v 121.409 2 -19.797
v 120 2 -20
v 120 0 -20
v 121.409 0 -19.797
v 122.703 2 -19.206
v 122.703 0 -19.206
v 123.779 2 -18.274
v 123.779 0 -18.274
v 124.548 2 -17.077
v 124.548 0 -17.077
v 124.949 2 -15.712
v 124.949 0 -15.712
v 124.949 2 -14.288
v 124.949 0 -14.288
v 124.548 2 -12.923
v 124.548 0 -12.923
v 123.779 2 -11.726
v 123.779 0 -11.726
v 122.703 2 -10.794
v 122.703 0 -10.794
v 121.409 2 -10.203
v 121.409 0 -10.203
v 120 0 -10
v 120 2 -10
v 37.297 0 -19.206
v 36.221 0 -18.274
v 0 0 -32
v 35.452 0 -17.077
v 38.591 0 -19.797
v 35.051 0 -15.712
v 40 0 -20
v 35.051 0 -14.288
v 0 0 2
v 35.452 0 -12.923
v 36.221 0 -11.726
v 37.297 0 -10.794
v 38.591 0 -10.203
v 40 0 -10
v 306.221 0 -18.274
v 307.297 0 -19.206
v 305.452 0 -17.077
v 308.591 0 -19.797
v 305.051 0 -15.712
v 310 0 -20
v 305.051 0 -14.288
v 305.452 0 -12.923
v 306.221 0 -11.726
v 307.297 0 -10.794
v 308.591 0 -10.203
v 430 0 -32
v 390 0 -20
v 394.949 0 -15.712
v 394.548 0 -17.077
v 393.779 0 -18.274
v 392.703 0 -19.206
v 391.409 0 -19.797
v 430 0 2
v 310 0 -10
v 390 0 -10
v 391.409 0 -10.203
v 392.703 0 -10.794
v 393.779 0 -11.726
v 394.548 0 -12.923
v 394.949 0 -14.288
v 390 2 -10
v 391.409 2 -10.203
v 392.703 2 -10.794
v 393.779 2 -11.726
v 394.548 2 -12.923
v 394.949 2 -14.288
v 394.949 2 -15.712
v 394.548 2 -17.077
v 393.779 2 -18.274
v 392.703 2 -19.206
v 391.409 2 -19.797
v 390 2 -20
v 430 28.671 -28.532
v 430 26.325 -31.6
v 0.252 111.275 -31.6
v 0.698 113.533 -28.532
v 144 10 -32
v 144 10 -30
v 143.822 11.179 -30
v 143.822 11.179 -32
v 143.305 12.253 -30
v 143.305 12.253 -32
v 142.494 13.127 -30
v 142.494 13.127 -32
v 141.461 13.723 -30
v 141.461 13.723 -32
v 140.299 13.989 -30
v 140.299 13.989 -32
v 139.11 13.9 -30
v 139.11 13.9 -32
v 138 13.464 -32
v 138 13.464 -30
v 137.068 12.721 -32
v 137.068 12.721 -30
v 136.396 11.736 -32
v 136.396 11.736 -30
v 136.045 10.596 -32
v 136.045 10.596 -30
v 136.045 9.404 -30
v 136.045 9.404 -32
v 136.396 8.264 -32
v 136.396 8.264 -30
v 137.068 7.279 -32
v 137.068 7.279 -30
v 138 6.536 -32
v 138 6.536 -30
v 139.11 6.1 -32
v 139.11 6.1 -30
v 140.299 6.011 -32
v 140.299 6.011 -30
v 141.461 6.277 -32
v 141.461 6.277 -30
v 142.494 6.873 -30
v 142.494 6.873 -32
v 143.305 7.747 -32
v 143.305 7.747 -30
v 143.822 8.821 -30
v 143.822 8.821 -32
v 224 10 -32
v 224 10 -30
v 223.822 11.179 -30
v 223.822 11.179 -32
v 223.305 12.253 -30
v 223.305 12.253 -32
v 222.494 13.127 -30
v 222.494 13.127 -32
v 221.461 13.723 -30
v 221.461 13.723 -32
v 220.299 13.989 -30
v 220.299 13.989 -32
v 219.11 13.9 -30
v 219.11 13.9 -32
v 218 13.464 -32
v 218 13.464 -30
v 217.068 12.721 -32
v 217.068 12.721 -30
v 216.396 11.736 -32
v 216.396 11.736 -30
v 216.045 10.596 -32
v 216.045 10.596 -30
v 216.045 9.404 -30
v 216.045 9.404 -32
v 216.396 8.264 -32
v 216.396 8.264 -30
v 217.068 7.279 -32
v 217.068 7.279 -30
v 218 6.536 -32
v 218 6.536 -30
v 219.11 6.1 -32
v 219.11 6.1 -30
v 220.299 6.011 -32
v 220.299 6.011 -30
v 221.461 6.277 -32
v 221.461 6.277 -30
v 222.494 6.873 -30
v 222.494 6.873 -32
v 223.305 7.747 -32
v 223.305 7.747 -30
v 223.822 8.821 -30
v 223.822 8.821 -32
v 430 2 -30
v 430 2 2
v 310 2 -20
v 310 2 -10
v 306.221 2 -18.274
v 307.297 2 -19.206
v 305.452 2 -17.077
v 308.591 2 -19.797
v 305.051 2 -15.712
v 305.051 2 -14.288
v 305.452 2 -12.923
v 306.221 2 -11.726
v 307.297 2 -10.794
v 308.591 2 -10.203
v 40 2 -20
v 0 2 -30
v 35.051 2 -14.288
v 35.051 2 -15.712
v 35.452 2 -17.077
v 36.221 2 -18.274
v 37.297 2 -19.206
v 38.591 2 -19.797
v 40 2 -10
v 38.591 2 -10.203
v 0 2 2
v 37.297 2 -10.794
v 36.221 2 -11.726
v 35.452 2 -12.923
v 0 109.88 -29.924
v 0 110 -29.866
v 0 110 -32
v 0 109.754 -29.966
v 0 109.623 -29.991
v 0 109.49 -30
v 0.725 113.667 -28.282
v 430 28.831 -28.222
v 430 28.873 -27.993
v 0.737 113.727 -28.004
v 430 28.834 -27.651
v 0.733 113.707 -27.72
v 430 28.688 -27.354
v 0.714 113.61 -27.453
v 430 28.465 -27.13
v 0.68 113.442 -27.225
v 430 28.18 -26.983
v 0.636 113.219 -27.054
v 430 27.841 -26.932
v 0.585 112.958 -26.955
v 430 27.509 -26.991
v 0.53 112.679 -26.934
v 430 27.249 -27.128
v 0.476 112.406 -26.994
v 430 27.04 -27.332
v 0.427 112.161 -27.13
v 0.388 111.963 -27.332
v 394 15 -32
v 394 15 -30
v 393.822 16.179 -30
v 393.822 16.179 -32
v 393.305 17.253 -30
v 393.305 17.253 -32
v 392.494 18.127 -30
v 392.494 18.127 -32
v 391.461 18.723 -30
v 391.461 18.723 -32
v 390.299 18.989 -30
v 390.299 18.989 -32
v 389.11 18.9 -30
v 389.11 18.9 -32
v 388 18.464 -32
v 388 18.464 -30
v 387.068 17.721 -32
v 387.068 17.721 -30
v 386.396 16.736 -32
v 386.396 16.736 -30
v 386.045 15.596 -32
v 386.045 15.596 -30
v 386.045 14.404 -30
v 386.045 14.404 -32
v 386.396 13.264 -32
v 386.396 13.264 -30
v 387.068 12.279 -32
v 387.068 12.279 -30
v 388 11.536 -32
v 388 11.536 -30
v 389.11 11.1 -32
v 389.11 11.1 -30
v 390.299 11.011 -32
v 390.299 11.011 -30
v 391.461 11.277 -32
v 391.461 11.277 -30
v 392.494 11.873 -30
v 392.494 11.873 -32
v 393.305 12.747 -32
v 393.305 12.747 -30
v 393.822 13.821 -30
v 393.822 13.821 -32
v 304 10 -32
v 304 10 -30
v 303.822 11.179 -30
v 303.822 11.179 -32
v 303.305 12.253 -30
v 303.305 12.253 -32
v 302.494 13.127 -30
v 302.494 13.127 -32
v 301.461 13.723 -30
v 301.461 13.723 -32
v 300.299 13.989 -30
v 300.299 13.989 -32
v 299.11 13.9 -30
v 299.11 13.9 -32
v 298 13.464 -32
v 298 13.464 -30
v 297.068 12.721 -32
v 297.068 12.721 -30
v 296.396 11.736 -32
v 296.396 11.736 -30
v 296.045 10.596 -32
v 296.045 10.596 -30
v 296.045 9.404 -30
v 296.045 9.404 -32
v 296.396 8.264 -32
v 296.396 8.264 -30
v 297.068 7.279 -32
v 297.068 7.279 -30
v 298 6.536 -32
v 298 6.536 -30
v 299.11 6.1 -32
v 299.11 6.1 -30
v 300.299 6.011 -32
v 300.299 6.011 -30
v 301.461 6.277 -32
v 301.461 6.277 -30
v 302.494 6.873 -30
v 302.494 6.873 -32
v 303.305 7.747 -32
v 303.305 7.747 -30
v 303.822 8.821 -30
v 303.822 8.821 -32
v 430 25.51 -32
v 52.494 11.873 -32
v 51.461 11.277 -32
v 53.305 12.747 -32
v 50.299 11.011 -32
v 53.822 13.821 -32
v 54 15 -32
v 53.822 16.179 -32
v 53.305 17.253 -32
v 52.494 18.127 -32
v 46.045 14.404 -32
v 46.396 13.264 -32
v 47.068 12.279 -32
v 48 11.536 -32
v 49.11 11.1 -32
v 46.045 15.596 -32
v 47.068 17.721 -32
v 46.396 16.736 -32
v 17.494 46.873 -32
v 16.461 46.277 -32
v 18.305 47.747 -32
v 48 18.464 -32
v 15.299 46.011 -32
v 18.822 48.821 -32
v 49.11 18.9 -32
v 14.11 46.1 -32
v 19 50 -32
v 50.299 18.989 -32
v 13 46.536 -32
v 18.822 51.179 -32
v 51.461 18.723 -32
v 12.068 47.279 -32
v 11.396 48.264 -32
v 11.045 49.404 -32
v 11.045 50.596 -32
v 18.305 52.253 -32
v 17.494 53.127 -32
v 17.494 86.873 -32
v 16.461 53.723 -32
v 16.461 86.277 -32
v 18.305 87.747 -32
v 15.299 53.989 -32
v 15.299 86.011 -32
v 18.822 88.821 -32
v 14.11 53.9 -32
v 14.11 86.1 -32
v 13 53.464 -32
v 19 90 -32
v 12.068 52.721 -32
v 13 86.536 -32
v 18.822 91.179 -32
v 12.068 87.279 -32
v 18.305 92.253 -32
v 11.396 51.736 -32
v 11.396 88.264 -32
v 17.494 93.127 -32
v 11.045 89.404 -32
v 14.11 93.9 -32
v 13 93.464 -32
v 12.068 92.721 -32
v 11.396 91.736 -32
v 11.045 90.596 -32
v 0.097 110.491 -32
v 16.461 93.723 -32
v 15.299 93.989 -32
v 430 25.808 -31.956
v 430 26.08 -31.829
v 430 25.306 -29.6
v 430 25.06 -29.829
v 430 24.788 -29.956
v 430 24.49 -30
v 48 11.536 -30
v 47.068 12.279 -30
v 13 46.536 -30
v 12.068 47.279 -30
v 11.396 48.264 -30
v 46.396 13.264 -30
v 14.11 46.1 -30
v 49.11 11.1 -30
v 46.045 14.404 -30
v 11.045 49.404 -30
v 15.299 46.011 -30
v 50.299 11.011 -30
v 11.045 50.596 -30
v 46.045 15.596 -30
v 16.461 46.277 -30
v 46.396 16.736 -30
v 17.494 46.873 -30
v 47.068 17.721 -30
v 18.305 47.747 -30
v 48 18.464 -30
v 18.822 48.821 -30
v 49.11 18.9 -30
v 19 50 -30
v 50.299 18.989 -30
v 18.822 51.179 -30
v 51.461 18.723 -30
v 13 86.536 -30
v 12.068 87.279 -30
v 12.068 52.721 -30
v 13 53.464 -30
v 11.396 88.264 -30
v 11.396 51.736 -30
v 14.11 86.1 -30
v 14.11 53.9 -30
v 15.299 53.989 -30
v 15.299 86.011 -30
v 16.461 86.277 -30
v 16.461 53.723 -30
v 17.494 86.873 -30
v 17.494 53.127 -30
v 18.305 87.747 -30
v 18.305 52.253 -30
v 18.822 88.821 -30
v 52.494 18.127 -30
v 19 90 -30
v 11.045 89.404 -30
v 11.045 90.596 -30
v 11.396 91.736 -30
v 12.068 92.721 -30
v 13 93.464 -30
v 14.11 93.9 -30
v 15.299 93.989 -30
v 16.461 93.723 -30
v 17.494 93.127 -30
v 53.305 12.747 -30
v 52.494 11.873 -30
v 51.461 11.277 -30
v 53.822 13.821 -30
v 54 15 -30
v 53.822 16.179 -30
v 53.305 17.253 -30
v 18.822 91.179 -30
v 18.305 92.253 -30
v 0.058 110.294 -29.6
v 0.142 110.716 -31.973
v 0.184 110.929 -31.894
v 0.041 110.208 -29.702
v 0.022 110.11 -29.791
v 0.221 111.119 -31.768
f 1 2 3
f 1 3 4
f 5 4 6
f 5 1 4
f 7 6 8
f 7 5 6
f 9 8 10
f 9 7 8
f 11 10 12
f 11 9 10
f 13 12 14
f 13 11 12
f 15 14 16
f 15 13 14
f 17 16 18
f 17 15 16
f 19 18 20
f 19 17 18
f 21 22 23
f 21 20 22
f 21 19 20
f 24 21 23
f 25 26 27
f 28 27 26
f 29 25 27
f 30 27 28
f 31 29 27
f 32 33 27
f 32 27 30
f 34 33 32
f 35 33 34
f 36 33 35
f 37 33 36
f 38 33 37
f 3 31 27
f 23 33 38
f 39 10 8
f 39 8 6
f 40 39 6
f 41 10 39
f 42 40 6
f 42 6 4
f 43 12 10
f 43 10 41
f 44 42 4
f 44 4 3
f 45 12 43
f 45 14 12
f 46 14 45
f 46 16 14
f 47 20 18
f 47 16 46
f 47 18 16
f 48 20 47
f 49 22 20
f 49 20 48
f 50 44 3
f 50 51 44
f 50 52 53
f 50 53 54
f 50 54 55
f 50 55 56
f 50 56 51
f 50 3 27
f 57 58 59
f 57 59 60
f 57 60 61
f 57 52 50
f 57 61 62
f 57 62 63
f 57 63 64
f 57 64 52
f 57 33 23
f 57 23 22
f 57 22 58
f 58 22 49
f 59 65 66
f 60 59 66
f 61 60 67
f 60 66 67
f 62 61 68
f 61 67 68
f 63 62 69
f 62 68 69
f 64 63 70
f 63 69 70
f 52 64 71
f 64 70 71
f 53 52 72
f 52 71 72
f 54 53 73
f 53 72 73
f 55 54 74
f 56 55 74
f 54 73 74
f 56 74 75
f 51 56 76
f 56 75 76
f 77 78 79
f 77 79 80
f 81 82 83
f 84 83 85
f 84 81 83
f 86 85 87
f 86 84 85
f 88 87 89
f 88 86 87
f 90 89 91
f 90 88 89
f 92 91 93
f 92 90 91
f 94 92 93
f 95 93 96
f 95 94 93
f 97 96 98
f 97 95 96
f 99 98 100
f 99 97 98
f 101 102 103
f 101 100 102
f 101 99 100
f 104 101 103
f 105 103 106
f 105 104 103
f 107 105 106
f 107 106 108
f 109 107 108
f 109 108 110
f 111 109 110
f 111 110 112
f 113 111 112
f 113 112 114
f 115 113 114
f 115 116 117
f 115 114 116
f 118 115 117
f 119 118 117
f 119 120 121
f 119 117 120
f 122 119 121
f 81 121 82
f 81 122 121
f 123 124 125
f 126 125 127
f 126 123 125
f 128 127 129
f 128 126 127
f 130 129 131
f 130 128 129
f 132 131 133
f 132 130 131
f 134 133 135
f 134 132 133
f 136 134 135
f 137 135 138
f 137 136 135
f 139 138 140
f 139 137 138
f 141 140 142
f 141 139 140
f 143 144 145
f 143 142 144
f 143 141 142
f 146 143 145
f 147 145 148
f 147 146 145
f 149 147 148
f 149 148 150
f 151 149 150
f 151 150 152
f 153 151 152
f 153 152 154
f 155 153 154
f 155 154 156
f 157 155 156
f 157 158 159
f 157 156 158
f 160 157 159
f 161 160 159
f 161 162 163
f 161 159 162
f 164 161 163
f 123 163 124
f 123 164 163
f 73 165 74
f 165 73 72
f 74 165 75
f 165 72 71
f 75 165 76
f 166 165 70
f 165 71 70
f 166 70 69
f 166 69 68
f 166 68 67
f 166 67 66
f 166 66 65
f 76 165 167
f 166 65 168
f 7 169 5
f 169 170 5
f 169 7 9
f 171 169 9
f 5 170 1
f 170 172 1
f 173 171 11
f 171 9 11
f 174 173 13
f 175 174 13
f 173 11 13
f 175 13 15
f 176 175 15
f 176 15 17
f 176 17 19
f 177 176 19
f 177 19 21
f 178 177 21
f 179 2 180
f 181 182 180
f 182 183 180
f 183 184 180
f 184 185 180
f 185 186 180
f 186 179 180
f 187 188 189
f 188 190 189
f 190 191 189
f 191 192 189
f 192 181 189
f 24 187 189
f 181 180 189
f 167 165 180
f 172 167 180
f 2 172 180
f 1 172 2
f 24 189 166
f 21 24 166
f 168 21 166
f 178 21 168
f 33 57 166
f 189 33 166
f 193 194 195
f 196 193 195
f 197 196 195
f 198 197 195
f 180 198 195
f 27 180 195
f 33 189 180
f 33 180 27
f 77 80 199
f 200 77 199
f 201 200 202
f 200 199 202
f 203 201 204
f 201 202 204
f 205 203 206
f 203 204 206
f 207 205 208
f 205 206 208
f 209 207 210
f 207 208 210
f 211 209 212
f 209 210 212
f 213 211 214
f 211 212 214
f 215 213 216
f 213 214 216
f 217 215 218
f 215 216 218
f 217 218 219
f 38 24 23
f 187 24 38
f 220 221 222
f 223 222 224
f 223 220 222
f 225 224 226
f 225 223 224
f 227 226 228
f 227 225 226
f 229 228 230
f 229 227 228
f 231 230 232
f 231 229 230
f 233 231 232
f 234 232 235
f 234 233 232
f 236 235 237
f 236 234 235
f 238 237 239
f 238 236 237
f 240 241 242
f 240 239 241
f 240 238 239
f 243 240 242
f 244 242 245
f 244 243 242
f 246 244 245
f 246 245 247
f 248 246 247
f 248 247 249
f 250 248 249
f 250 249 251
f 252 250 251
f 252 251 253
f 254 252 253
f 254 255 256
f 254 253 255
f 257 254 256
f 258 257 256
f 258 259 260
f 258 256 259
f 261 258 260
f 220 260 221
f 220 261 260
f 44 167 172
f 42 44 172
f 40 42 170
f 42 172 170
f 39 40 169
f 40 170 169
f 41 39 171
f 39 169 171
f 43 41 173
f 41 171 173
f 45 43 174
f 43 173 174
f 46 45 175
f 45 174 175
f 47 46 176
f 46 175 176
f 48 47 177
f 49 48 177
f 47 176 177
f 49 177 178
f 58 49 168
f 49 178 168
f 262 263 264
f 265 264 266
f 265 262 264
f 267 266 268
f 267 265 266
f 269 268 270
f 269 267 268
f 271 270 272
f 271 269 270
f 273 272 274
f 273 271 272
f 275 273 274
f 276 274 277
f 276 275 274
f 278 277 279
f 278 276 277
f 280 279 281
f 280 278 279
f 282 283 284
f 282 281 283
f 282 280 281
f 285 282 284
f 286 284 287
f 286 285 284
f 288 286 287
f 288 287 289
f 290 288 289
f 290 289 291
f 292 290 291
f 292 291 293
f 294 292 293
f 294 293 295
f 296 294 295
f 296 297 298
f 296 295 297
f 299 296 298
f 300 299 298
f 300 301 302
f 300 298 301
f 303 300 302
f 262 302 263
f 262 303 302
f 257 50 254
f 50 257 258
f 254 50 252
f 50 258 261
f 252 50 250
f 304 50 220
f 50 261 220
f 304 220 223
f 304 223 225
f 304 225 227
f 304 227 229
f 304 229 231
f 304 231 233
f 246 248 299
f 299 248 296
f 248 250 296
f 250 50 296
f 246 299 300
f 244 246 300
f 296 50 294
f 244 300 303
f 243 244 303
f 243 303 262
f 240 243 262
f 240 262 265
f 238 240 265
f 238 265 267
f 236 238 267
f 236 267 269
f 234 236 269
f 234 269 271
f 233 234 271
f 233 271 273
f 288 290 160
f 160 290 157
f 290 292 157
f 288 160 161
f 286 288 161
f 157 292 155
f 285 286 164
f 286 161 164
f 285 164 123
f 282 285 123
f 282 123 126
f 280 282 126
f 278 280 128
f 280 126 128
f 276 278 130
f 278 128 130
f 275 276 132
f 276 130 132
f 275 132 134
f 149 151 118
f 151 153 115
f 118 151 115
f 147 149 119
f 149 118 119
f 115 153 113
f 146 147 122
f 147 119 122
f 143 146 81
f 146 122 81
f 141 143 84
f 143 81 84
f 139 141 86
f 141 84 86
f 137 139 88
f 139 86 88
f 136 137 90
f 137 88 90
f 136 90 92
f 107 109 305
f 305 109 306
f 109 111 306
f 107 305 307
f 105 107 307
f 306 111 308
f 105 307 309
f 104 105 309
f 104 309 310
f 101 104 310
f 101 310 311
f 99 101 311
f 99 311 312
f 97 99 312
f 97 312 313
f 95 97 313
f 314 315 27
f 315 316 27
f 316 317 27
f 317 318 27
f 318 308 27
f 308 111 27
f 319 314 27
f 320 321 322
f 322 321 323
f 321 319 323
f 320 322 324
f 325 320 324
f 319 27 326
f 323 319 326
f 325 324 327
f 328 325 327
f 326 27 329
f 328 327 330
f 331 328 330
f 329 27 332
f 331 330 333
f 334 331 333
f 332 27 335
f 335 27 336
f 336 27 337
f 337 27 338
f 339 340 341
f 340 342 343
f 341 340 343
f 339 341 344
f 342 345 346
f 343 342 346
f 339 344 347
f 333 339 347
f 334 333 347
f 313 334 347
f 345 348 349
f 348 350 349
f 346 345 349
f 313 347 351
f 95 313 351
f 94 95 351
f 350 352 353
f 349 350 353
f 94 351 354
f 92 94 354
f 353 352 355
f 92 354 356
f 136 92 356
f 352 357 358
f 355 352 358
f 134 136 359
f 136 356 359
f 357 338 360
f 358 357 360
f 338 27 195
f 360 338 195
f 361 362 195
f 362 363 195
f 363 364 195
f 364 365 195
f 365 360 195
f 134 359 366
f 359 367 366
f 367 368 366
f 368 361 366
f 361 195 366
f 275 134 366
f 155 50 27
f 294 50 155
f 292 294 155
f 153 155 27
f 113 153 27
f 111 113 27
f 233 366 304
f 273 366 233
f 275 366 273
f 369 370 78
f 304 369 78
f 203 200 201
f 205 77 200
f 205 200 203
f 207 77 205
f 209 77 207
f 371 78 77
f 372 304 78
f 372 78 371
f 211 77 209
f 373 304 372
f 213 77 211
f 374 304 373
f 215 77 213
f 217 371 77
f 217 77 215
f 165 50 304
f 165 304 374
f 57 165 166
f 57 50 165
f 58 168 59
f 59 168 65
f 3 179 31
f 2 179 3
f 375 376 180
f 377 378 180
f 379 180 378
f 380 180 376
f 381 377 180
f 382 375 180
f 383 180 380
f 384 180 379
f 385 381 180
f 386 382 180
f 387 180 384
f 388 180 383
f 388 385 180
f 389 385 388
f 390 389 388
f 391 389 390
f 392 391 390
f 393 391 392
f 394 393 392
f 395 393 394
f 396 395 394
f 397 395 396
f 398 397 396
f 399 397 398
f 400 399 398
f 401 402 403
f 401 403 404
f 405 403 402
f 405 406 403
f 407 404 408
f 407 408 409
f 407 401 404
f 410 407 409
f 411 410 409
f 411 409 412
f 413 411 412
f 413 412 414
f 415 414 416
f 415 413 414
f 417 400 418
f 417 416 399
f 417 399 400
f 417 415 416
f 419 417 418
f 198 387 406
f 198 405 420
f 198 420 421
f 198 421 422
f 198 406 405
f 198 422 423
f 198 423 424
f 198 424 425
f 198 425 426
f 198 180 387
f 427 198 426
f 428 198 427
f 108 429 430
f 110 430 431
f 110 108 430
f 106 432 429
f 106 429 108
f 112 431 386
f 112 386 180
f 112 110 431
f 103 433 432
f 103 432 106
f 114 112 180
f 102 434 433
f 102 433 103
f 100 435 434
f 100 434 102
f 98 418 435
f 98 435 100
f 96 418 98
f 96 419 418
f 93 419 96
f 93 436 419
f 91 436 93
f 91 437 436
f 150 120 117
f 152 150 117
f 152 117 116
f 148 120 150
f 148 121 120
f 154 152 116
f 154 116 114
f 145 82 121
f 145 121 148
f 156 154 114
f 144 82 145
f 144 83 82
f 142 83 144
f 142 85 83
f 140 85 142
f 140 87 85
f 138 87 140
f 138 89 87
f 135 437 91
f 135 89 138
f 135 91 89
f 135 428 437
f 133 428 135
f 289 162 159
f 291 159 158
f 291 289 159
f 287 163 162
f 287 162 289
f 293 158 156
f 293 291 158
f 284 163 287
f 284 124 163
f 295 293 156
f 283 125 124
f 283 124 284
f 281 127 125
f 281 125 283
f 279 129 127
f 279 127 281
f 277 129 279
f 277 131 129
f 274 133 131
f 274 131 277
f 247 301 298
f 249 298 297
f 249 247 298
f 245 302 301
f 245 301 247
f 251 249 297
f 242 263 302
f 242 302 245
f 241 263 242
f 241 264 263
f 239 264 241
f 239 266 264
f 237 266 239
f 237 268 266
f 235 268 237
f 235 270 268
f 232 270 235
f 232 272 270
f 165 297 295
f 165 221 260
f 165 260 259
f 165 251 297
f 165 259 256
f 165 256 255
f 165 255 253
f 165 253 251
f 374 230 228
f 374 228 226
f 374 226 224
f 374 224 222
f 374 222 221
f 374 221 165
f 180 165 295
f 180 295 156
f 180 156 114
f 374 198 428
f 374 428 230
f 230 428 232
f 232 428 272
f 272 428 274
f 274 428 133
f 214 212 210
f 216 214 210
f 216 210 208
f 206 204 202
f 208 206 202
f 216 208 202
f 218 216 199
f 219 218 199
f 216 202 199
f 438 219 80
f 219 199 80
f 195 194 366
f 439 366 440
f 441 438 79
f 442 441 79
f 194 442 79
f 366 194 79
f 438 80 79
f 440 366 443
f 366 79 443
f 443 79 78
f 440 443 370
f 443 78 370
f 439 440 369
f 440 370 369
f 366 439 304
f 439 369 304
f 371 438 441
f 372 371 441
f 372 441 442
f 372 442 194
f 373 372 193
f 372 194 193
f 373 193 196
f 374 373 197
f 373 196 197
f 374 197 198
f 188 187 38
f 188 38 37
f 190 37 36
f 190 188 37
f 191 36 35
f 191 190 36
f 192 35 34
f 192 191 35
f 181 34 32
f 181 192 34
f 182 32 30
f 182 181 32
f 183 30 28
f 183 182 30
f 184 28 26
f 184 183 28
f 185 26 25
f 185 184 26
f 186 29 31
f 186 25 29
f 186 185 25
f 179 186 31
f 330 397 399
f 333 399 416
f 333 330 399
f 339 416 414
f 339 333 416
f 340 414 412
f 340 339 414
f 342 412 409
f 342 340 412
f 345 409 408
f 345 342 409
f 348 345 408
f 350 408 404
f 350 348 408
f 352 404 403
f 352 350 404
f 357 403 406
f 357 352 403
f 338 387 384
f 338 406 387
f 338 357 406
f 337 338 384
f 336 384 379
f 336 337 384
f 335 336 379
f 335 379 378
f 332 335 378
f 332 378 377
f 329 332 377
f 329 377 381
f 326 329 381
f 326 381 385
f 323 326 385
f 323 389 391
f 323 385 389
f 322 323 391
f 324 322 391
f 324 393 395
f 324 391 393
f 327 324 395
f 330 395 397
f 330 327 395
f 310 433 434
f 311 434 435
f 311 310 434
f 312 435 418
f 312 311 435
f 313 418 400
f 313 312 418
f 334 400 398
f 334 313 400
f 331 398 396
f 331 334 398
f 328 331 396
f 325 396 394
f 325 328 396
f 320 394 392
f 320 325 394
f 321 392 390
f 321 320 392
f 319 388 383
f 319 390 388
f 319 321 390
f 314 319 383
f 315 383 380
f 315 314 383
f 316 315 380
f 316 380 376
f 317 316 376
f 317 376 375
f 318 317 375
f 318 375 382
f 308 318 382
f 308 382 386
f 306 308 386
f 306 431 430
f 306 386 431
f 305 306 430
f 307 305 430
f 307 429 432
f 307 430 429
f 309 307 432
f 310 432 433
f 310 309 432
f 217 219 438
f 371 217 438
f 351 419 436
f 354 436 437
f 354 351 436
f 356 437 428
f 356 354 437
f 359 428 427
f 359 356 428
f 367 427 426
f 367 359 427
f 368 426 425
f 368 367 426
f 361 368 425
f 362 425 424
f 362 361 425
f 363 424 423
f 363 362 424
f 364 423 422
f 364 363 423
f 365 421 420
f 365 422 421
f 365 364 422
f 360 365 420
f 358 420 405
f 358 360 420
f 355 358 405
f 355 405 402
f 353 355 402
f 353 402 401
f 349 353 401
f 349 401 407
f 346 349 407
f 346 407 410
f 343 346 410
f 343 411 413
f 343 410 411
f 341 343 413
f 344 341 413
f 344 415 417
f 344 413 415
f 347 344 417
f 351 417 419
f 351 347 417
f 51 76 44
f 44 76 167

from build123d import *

# Parameters (mm, degrees)
BOSS_EXTRUDE1_DEPTH = 2
SKETCH3_W           = 430
SKETCH3_H           = 2
BOSS_EXTRUDE2_DEPTH = 30
CUT_EXTRUDE1_DEPTH  = 50
SKETCH7_R           = 4
CUT_EXTRUDE2_DEPTH  = 445.998876403
SKETCH8_R           = 4
CUT_EXTRUDE3_DEPTH  = 445.998876403
BOSS_EXTRUDE4_REACH = 466.157
FILLET3_R           = 1
FILLET4_R           = 1
SKETCH14_W          = 14.198164628
SKETCH14_H          = 140.679364316
CUT_EXTRUDE6_DEPTH  = 446.935341302


with BuildPart() as part:
    # Sketch2 → Boss-Extrude1 (new body)
    with BuildSketch(Plane.XY):
        Polygon((0, 0), (430, 0), (430, 25), (0, 110), align=None)
    boss_extrude1 = extrude(amount=BOSS_EXTRUDE1_DEPTH)

    # Sketch3 → Boss-Extrude2 (add)
    with BuildSketch(Plane(origin=(0, 0, 0), x_dir=(-1, 0, 0), z_dir=(0, 0, -1))):
        with Locations((-215, 1)):
            Rectangle(SKETCH3_W, SKETCH3_H)
    extrude(amount=BOSS_EXTRUDE2_DEPTH)

    # Sketch4 → Cut-Extrude1 (cut)
    with BuildSketch(Plane(origin=(0, 2, 0), x_dir=(1, 0, 0), z_dir=(0, 1, 0))):
        with BuildLine():
            Line((40, 20), (120, 20))
            ThreePointArc((120, 20), (125, 15), (120, 10))
            Line((120, 10), (40, 10))
            ThreePointArc((40, 10), (35, 15), (40, 20))
        make_face()
        with BuildLine():
            Line((390, 20), (310, 20))
            ThreePointArc((310, 20), (305, 15), (310, 10))
            Line((310, 10), (390, 10))
            ThreePointArc((390, 10), (395, 15), (390, 20))
        make_face()
    extrude(amount=-CUT_EXTRUDE1_DEPTH, mode=Mode.SUBTRACT)

    # Sketch7 → Cut-Extrude2 (cut, through all)
    with BuildSketch(Plane.XY.offset(2)):
        with Locations((15, 50)):
            Circle(SKETCH7_R)
        with Locations((50, 15)):
            Circle(SKETCH7_R)
        with Locations((390, 15)):
            Circle(SKETCH7_R)
        with Locations((15, 90)):
            Circle(SKETCH7_R)
    cut_extrude2 = extrude(amount=-CUT_EXTRUDE2_DEPTH, mode=Mode.SUBTRACT)

    # Sketch8 → Cut-Extrude3 (cut, through all)
    with BuildSketch(Plane.XY.offset(2)):
        with Locations((140, 10)):
            Circle(SKETCH8_R)
        with Locations((220, 10)):
            Circle(SKETCH8_R)
        with Locations((300, 10)):
            Circle(SKETCH8_R)
    cut_extrude3 = extrude(amount=-CUT_EXTRUDE3_DEPTH, mode=Mode.SUBTRACT)

    # Boss-Extrude4: up to this plane
    boss_extrude4_end = Plane(origin=(430, 0, 2), z_dir=(-1, 0, 0))
    # Sketch12 → Boss-Extrude4 (add, up to the surface)
    with BuildSketch(Plane(origin=(-20.926480156, 4.136629798, 0), x_dir=(0, 0, -1), z_dir=(0.9810169593645325, -0.19392195708368665, 0)), mode=Mode.PRIVATE) as boss_extrude4_sk1:
        with BuildLine():
            Line((2.668468057, 109.913216573), (0, 107.91186553))
            Line((0, 107.91186553), (-2, 107.91186553))
            Line((-2, 107.91186553), (-2, 108.91186553))
            Line((-2, 108.91186553), (1.468468057, 111.513216573))
            ThreePointArc((1.468468057, 111.513216573), (2.868468057, 111.313216573), (2.668468057, 109.913216573))
        make_face()
    boss_extrude4_tool1 = split(extrude(boss_extrude4_sk1.sketch, amount=BOSS_EXTRUDE4_REACH, mode=Mode.PRIVATE), bisect_by=boss_extrude4_end, keep=Keep.BOTH, mode=Mode.PRIVATE)
    boss_extrude4 = boss_extrude4_tool1.solids().sort_by_distance((0.341058, 111.725355, -0.613229))[0]
    add(boss_extrude4)

    # Fillet3
    fillet3_edges = [part.edges().sort_by_distance(p)[0] for p in [
        (215.096960979, 68.500183664, 2),
        (215, 67.5, 0),
    ]]
    fillet(fillet3_edges, radius=FILLET3_R)

    # Mirror1: Boss-Extrude1 across plane
    add(boss_extrude1.mirror(Plane(origin=(0, 0, -15), x_dir=(1, 0, 0), z_dir=(0, 0, -1))))

    # Mirror2: Boss-Extrude4 across plane
    add(boss_extrude4.mirror(Plane(origin=(0, 0, -15), x_dir=(1, 0, 0), z_dir=(0, 0, -1))))

    # Fillet4
    fillet4_edges = [part.edges().sort_by_distance(p)[0] for p in [
        (215, 67.5, -30),
        (215.096960979, 68.500183664, -32),
    ]]
    fillet(fillet4_edges, radius=FILLET4_R)

    # Sketch14 → Cut-Extrude6 (cut, through all)
    with BuildSketch(Plane.ZY):
        with Locations((1.254098972, 72.339682158)):
            Rectangle(SKETCH14_W, SKETCH14_H)
    extrude(amount=-CUT_EXTRUDE6_DEPTH, mode=Mode.SUBTRACT)

    # Mirror3: Cut-Extrude2, Cut-Extrude3 across plane
    add(cut_extrude2.mirror(Plane(origin=(0, 0, -15), x_dir=(1, 0, 0), z_dir=(0, 0, -1))), mode=Mode.SUBTRACT)
    add(cut_extrude3.mirror(Plane(origin=(0, 0, -15), x_dir=(1, 0, 0), z_dir=(0, 0, -1))), mode=Mode.SUBTRACT)


solid = part.part
